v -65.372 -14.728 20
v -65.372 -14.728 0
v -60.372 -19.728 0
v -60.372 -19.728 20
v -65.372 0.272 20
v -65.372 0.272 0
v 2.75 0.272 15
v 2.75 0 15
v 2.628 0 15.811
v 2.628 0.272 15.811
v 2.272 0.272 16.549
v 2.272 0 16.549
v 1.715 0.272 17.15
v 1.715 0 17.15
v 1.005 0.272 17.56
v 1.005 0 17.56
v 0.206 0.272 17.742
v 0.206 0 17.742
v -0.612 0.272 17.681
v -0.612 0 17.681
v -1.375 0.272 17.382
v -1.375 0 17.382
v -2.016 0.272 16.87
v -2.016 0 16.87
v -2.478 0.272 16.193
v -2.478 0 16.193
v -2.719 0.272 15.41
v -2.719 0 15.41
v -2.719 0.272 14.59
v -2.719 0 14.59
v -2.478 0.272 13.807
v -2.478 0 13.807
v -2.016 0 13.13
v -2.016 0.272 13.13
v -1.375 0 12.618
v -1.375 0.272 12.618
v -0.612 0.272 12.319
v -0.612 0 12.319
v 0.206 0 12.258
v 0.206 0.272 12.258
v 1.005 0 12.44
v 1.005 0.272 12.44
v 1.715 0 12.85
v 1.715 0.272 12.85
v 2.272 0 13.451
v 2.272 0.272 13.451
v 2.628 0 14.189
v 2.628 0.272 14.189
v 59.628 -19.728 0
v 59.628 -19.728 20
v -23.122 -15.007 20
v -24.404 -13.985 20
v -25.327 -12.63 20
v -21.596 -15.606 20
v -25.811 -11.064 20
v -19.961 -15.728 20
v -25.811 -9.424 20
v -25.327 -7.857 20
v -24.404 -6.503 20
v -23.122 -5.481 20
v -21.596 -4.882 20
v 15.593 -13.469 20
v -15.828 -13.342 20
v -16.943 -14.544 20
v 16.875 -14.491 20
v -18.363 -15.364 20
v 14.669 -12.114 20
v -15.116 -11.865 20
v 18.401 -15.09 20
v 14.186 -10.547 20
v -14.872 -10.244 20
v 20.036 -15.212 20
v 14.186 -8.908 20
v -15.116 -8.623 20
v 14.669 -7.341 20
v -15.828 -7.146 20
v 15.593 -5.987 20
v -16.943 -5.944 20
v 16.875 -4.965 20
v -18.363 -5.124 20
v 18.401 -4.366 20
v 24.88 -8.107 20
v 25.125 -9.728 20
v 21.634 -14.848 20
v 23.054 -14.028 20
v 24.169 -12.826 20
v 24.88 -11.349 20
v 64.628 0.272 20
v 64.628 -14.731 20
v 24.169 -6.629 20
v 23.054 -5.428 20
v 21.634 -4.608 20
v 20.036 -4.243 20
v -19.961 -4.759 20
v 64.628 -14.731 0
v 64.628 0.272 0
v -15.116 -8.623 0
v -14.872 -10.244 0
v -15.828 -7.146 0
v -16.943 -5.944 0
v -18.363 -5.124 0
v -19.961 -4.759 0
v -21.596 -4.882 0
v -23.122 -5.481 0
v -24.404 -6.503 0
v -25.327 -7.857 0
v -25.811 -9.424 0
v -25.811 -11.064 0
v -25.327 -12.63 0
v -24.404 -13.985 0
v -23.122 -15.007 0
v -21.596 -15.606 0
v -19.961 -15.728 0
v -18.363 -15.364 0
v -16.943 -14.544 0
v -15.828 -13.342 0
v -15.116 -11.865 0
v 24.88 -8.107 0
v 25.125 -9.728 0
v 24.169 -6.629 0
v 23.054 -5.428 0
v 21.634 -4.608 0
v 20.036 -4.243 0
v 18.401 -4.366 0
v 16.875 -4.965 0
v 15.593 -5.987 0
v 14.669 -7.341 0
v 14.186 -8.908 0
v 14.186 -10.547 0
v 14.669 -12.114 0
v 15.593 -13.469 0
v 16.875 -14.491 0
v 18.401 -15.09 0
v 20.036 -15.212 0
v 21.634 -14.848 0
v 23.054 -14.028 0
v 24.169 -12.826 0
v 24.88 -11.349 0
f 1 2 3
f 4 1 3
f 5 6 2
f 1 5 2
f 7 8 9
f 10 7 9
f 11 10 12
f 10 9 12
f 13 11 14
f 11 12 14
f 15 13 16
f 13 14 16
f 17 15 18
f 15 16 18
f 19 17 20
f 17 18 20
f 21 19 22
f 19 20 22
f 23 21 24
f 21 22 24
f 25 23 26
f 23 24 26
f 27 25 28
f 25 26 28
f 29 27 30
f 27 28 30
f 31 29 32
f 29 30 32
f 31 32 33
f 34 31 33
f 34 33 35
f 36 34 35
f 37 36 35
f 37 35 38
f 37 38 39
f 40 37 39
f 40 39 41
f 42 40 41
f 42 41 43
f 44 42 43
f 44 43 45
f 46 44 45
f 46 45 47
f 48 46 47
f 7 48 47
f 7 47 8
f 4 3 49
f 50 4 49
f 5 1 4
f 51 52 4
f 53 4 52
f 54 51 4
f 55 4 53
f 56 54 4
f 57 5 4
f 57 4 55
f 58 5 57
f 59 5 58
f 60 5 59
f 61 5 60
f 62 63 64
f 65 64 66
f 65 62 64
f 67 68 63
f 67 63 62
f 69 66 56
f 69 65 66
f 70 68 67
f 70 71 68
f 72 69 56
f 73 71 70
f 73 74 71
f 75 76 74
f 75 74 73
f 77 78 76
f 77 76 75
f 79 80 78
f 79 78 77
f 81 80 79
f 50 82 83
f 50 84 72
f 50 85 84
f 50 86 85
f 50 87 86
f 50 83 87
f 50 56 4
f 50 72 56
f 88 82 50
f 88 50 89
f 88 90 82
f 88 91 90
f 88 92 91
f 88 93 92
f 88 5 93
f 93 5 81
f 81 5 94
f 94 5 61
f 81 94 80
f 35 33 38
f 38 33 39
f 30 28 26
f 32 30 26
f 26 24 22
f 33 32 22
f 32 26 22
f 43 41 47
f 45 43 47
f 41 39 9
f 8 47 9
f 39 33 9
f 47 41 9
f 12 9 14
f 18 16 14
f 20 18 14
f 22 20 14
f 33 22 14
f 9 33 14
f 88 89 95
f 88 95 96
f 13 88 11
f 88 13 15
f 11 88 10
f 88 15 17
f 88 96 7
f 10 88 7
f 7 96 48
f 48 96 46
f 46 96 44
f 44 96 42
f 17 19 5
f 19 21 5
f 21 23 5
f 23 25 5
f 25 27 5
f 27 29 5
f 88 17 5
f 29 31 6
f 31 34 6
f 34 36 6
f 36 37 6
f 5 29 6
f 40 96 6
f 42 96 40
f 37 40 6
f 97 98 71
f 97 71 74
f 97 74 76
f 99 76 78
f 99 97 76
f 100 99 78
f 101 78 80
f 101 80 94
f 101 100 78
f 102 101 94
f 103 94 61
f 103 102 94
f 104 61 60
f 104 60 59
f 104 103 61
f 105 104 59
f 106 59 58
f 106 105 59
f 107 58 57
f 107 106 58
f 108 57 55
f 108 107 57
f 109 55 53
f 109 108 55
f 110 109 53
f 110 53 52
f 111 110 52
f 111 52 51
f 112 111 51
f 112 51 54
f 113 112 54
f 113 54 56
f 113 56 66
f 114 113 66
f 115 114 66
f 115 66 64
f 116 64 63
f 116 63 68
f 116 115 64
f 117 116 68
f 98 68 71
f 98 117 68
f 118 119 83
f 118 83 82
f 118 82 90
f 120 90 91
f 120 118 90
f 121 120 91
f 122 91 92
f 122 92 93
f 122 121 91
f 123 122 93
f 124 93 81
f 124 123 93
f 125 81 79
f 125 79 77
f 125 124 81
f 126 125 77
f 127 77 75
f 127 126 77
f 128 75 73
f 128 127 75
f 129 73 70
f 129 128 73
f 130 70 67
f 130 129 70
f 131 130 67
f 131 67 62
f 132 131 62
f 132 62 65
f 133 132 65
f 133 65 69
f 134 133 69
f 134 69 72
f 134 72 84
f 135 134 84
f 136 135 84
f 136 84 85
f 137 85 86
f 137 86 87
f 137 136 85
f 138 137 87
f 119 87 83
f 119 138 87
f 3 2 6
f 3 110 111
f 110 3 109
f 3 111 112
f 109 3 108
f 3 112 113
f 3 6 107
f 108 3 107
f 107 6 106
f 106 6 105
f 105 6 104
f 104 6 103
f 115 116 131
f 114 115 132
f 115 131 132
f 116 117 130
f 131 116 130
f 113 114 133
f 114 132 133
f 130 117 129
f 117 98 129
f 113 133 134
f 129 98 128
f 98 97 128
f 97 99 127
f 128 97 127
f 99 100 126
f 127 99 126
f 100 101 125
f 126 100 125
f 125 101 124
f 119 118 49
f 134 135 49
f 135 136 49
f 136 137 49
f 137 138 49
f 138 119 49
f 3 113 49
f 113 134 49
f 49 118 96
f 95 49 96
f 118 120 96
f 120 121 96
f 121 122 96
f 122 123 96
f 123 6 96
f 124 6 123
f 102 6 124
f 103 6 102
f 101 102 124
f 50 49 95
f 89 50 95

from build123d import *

# Parameters (mm, degrees)
F0_R     = 5.5
F2_DEPTH = 20
F4_D     = 5.5
F4_DEPTH = 12
F4_TIP   = 1.6523667023


# Not quite as in the source:
# - the program builds the solid bodies; features that only make, move or delete a surface that nothing else refers to are left out


with BuildPart() as f2:
    # F0 (on Top) → F2 (new body)
    with BuildSketch(Plane.XY):
        Polygon((64.6278701635, 0.2722779787), (-65.3721298365, 0.2722779787), (-65.3721298365, -14.7277220213), (-60.3721298365, -19.7277220213), (59.6278701635, -19.7277220213), (64.6278701635, -14.7314790532), align=None)
        with Locations((-20.3721298365, -10.2438455071)):
            Circle(F0_R, mode=Mode.SUBTRACT)
        with Locations((19.6245402317, -9.7277220213)):
            Circle(F0_R, mode=Mode.SUBTRACT)
    extrude(amount=F2_DEPTH)

    # F4 (one way)
    with BuildSketch(Plane.XZ):
        with Locations((0, 15)):
            Circle(F4_D / 2)
    extrude(amount=-F4_DEPTH, mode=Mode.SUBTRACT)
    with Locations(Plane.XZ):
        with Locations((0, 15)):
            with Locations((0, 0, -(F4_DEPTH + F4_TIP / 2))):  # 118° drill point
                Cone(0, F4_D / 2, F4_TIP, mode=Mode.SUBTRACT)


solid = f2.part
